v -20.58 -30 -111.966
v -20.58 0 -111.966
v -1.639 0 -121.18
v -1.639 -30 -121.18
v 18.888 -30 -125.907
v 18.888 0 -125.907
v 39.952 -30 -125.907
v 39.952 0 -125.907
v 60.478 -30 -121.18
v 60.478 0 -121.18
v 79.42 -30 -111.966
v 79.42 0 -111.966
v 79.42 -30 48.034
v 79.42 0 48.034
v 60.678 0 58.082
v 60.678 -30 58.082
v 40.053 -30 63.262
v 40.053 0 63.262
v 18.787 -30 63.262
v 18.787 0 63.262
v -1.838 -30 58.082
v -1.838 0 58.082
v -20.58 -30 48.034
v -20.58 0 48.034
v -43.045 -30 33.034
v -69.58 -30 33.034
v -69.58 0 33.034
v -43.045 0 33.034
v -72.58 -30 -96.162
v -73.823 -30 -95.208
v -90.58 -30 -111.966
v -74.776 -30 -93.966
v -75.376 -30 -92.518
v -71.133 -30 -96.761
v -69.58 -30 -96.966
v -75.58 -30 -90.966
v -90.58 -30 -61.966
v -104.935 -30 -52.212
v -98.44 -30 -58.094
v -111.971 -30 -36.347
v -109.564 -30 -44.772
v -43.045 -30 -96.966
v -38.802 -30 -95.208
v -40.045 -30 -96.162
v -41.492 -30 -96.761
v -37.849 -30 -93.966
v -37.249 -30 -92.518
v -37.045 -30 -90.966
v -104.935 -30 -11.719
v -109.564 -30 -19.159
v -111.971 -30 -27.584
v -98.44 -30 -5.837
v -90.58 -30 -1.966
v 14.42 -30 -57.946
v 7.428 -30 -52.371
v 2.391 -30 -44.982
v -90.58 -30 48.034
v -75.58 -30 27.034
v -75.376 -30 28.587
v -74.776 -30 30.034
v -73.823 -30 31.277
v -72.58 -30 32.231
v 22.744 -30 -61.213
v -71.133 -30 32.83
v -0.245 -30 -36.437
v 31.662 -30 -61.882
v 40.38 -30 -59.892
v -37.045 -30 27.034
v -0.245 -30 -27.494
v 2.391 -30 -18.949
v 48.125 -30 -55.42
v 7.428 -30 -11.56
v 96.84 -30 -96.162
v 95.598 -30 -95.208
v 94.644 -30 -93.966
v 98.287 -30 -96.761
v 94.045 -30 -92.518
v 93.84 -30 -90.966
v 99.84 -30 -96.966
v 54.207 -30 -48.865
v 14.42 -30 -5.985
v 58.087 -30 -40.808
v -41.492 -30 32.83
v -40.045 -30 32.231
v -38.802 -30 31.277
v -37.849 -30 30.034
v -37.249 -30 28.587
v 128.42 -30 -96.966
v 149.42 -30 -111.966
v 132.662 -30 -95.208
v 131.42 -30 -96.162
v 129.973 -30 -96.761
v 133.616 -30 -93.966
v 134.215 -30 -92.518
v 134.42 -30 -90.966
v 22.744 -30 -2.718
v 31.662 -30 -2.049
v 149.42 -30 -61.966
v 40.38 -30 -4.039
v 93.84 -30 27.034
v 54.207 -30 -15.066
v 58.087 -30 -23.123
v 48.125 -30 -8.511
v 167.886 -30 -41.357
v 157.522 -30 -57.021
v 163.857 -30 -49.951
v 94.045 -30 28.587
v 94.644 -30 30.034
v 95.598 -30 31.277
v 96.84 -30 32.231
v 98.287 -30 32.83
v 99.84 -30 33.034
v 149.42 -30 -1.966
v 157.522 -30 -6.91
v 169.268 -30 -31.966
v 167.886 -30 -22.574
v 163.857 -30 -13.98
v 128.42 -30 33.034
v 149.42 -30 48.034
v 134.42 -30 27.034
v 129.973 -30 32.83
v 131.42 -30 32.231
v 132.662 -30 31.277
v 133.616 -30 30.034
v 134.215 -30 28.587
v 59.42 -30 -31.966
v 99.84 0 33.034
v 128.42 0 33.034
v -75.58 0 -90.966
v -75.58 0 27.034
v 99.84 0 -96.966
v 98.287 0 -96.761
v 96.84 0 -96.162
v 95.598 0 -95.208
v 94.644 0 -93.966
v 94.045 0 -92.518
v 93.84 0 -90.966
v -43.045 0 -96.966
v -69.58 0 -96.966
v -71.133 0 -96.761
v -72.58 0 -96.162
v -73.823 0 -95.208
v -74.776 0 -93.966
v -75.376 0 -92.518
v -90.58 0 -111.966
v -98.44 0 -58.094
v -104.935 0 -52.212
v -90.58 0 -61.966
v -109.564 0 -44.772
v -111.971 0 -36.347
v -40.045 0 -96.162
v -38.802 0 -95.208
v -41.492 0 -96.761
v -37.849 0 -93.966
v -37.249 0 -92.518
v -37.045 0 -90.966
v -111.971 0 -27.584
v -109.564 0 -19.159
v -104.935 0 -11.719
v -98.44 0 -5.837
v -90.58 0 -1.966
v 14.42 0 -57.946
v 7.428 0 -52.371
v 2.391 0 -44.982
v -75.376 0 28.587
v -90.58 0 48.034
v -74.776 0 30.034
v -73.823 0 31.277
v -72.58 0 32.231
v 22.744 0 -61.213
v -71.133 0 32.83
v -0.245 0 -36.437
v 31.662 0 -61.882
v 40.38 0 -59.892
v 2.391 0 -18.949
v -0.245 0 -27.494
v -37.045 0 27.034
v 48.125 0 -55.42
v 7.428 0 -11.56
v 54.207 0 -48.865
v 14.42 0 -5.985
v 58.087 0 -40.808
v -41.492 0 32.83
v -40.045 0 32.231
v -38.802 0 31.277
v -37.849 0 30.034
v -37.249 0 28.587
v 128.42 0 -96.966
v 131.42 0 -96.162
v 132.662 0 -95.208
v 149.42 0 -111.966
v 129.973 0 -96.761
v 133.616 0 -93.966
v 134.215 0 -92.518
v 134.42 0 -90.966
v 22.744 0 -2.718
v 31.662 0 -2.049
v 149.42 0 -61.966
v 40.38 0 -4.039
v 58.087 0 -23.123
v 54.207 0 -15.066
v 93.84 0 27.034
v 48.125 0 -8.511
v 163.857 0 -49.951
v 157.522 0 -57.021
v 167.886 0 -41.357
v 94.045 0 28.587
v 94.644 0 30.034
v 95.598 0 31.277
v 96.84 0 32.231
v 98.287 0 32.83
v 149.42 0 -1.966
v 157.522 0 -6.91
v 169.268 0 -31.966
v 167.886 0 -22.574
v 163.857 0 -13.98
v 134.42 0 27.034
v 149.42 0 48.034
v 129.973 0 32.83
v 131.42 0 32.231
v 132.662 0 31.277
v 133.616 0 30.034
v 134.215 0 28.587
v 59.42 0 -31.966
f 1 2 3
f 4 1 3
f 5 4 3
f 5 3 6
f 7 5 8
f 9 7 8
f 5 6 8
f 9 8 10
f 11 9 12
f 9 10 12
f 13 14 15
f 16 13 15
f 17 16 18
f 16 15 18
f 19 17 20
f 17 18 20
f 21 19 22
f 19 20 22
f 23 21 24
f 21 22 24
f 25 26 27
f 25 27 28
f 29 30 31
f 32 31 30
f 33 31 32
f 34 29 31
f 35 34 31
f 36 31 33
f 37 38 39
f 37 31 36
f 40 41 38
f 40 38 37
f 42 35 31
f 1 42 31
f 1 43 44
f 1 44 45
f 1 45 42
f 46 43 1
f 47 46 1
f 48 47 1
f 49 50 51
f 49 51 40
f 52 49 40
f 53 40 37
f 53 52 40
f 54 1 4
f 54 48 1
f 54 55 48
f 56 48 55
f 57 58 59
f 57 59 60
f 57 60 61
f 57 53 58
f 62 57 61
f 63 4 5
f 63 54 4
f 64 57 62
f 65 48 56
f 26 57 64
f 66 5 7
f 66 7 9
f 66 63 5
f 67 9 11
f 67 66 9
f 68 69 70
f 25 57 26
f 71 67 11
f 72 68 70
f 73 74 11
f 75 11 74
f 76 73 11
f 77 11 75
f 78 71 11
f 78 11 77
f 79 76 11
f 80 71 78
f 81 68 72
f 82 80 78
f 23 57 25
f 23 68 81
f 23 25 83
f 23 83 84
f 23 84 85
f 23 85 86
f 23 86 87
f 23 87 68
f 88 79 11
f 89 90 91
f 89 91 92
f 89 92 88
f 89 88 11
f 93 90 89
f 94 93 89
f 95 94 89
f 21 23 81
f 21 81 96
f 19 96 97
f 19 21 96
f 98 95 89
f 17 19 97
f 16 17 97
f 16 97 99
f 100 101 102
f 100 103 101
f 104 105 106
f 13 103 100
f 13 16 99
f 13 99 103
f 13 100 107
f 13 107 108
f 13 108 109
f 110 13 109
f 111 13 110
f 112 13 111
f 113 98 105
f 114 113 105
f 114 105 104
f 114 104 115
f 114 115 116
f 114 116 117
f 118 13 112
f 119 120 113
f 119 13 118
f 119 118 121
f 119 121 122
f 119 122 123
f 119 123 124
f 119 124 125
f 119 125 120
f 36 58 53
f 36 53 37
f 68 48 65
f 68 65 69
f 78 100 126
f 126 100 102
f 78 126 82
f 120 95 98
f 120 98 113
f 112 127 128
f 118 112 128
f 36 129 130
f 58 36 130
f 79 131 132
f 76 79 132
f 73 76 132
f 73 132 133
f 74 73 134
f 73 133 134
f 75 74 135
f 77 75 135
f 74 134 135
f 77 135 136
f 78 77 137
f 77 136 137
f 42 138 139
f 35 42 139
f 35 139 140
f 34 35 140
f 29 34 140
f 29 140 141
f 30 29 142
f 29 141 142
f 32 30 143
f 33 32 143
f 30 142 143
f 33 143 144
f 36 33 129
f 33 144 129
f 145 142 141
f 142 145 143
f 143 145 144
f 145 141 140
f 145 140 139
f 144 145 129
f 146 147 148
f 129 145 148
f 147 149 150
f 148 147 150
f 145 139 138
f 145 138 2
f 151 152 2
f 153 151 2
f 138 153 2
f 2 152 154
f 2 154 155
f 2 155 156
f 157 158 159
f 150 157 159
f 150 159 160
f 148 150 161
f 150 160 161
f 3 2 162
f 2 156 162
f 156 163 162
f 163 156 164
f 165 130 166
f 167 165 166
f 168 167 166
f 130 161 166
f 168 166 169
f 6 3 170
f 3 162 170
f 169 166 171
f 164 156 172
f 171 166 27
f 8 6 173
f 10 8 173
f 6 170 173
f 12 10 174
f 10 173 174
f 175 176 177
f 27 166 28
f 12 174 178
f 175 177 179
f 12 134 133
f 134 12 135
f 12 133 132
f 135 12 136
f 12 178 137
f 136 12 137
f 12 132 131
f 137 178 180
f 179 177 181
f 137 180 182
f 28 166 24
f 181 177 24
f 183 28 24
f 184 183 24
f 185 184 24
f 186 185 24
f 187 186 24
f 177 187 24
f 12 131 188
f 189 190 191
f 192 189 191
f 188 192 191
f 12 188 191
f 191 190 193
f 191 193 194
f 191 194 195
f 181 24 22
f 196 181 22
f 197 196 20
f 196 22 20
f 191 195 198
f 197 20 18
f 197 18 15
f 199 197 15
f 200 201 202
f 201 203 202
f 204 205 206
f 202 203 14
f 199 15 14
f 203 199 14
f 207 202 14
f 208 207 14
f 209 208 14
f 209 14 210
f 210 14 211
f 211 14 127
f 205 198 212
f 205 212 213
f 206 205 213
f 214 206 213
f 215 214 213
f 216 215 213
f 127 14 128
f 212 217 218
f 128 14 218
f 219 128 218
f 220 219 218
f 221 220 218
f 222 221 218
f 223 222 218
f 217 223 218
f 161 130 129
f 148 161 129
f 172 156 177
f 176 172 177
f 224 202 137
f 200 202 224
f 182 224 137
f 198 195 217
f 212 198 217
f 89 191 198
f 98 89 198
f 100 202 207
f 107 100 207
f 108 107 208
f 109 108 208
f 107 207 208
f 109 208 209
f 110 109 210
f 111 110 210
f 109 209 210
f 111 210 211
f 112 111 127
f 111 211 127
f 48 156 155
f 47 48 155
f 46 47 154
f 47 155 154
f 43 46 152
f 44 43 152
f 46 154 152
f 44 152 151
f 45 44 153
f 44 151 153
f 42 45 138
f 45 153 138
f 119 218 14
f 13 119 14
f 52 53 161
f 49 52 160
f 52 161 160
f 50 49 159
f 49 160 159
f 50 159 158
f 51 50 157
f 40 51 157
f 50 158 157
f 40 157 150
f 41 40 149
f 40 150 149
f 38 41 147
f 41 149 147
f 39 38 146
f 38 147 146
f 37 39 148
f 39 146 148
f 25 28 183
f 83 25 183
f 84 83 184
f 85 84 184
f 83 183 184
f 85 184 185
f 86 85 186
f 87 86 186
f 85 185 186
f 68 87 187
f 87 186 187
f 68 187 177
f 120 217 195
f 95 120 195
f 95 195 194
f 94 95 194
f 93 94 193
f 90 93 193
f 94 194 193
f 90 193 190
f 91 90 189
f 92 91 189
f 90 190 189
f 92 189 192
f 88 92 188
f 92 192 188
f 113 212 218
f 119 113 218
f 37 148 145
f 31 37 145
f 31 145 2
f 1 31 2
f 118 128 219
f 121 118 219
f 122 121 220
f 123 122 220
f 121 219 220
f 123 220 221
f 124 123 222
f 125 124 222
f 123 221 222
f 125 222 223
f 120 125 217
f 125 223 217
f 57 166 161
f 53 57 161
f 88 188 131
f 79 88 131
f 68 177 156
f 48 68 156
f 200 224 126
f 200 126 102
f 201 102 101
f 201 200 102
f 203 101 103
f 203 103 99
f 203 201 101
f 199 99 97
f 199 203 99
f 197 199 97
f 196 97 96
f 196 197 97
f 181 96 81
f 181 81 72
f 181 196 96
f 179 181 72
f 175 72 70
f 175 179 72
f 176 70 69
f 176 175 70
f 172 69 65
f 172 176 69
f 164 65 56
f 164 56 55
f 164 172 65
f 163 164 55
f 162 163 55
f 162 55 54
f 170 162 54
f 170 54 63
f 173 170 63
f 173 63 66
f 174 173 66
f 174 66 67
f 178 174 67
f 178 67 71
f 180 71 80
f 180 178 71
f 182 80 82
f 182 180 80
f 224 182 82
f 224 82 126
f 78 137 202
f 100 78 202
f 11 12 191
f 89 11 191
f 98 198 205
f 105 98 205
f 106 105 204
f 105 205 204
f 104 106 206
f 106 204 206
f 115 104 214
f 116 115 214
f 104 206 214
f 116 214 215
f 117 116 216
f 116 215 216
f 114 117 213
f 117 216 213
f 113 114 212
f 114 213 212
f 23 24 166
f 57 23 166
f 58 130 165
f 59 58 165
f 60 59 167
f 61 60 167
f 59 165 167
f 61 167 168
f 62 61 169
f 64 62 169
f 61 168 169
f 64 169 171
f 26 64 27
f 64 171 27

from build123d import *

# Parameters (mm, degrees)
F0_R     = 30
F1_DEPTH = 30


with BuildPart() as f1:
    # F0 (on Front) → F1 (new body)
    with BuildSketch(Plane.XZ):
        with BuildLine():
            ThreePointArc((79.419856, 48.034481), (29.419856, 63.916465), (-20.580144, 48.034481))
            Line((-20.580144, 48.034481), (-90.580144, 48.034481))
            Line((-90.580144, 48.034481), (-90.580144, -1.965519))
            ThreePointArc((-90.580144, -1.965519), (-112.275858, -31.965519), (-90.580144, -61.965519))
            Line((-90.580144, -61.965519), (-90.580144, -111.965519))
            Line((-90.580144, -111.965519), (-20.580144, -111.965519))
            ThreePointArc((-20.580144, -111.965519), (29.419856, -126.504106), (79.419856, -111.965519))
            Line((79.419856, -111.965519), (149.419856, -111.965519))
            Line((149.419856, -111.965519), (149.419856, -61.965519))
            ThreePointArc((149.419856, -61.965519), (169.267812, -31.965519), (149.419856, -1.965519))
            Line((149.419856, -1.965519), (149.419856, 48.034481))
            Line((149.419856, 48.034481), (79.419856, 48.034481))
        make_face()
        with BuildLine():
            ThreePointArc((-75.580144, 27.034481), (-73.822784, 31.277122), (-69.580144, 33.034481))
            Line((-69.580144, 33.034481), (-43.045036, 33.034481))
            ThreePointArc((-43.045036, 33.034481), (-38.802395, 31.277122), (-37.045036, 27.034481))
            Line((-37.045036, 27.034481), (-37.045036, -90.965519))
            ThreePointArc((-37.045036, -90.965519), (-38.802395, -95.20816), (-43.045036, -96.965519))
            Line((-43.045036, -96.965519), (-69.580144, -96.965519))
            ThreePointArc((-69.580144, -96.965519), (-73.822784, -95.20816), (-75.580144, -90.965519))
            Line((-75.580144, -90.965519), (-75.580144, 27.034481))
        make_face(mode=Mode.SUBTRACT)
        with Locations((29.419856, -31.965519)):
            Circle(F0_R, mode=Mode.SUBTRACT)
        with BuildLine():
            ThreePointArc((93.84039, 27.034481), (95.59775, 31.277122), (99.84039, 33.034481))
            Line((99.84039, 33.034481), (128.419856, 33.034481))
            ThreePointArc((128.419856, 33.034481), (132.662497, 31.277122), (134.419856, 27.034481))
            Line((134.419856, 27.034481), (134.419856, -90.965519))
            ThreePointArc((134.419856, -90.965519), (132.662497, -95.20816), (128.419856, -96.965519))
            Line((128.419856, -96.965519), (99.84039, -96.965519))
            ThreePointArc((99.84039, -96.965519), (95.59775, -95.20816), (93.84039, -90.965519))
            Line((93.84039, -90.965519), (93.84039, 27.034481))
        make_face(mode=Mode.SUBTRACT)
    extrude(amount=F1_DEPTH)


solid = f1.part
